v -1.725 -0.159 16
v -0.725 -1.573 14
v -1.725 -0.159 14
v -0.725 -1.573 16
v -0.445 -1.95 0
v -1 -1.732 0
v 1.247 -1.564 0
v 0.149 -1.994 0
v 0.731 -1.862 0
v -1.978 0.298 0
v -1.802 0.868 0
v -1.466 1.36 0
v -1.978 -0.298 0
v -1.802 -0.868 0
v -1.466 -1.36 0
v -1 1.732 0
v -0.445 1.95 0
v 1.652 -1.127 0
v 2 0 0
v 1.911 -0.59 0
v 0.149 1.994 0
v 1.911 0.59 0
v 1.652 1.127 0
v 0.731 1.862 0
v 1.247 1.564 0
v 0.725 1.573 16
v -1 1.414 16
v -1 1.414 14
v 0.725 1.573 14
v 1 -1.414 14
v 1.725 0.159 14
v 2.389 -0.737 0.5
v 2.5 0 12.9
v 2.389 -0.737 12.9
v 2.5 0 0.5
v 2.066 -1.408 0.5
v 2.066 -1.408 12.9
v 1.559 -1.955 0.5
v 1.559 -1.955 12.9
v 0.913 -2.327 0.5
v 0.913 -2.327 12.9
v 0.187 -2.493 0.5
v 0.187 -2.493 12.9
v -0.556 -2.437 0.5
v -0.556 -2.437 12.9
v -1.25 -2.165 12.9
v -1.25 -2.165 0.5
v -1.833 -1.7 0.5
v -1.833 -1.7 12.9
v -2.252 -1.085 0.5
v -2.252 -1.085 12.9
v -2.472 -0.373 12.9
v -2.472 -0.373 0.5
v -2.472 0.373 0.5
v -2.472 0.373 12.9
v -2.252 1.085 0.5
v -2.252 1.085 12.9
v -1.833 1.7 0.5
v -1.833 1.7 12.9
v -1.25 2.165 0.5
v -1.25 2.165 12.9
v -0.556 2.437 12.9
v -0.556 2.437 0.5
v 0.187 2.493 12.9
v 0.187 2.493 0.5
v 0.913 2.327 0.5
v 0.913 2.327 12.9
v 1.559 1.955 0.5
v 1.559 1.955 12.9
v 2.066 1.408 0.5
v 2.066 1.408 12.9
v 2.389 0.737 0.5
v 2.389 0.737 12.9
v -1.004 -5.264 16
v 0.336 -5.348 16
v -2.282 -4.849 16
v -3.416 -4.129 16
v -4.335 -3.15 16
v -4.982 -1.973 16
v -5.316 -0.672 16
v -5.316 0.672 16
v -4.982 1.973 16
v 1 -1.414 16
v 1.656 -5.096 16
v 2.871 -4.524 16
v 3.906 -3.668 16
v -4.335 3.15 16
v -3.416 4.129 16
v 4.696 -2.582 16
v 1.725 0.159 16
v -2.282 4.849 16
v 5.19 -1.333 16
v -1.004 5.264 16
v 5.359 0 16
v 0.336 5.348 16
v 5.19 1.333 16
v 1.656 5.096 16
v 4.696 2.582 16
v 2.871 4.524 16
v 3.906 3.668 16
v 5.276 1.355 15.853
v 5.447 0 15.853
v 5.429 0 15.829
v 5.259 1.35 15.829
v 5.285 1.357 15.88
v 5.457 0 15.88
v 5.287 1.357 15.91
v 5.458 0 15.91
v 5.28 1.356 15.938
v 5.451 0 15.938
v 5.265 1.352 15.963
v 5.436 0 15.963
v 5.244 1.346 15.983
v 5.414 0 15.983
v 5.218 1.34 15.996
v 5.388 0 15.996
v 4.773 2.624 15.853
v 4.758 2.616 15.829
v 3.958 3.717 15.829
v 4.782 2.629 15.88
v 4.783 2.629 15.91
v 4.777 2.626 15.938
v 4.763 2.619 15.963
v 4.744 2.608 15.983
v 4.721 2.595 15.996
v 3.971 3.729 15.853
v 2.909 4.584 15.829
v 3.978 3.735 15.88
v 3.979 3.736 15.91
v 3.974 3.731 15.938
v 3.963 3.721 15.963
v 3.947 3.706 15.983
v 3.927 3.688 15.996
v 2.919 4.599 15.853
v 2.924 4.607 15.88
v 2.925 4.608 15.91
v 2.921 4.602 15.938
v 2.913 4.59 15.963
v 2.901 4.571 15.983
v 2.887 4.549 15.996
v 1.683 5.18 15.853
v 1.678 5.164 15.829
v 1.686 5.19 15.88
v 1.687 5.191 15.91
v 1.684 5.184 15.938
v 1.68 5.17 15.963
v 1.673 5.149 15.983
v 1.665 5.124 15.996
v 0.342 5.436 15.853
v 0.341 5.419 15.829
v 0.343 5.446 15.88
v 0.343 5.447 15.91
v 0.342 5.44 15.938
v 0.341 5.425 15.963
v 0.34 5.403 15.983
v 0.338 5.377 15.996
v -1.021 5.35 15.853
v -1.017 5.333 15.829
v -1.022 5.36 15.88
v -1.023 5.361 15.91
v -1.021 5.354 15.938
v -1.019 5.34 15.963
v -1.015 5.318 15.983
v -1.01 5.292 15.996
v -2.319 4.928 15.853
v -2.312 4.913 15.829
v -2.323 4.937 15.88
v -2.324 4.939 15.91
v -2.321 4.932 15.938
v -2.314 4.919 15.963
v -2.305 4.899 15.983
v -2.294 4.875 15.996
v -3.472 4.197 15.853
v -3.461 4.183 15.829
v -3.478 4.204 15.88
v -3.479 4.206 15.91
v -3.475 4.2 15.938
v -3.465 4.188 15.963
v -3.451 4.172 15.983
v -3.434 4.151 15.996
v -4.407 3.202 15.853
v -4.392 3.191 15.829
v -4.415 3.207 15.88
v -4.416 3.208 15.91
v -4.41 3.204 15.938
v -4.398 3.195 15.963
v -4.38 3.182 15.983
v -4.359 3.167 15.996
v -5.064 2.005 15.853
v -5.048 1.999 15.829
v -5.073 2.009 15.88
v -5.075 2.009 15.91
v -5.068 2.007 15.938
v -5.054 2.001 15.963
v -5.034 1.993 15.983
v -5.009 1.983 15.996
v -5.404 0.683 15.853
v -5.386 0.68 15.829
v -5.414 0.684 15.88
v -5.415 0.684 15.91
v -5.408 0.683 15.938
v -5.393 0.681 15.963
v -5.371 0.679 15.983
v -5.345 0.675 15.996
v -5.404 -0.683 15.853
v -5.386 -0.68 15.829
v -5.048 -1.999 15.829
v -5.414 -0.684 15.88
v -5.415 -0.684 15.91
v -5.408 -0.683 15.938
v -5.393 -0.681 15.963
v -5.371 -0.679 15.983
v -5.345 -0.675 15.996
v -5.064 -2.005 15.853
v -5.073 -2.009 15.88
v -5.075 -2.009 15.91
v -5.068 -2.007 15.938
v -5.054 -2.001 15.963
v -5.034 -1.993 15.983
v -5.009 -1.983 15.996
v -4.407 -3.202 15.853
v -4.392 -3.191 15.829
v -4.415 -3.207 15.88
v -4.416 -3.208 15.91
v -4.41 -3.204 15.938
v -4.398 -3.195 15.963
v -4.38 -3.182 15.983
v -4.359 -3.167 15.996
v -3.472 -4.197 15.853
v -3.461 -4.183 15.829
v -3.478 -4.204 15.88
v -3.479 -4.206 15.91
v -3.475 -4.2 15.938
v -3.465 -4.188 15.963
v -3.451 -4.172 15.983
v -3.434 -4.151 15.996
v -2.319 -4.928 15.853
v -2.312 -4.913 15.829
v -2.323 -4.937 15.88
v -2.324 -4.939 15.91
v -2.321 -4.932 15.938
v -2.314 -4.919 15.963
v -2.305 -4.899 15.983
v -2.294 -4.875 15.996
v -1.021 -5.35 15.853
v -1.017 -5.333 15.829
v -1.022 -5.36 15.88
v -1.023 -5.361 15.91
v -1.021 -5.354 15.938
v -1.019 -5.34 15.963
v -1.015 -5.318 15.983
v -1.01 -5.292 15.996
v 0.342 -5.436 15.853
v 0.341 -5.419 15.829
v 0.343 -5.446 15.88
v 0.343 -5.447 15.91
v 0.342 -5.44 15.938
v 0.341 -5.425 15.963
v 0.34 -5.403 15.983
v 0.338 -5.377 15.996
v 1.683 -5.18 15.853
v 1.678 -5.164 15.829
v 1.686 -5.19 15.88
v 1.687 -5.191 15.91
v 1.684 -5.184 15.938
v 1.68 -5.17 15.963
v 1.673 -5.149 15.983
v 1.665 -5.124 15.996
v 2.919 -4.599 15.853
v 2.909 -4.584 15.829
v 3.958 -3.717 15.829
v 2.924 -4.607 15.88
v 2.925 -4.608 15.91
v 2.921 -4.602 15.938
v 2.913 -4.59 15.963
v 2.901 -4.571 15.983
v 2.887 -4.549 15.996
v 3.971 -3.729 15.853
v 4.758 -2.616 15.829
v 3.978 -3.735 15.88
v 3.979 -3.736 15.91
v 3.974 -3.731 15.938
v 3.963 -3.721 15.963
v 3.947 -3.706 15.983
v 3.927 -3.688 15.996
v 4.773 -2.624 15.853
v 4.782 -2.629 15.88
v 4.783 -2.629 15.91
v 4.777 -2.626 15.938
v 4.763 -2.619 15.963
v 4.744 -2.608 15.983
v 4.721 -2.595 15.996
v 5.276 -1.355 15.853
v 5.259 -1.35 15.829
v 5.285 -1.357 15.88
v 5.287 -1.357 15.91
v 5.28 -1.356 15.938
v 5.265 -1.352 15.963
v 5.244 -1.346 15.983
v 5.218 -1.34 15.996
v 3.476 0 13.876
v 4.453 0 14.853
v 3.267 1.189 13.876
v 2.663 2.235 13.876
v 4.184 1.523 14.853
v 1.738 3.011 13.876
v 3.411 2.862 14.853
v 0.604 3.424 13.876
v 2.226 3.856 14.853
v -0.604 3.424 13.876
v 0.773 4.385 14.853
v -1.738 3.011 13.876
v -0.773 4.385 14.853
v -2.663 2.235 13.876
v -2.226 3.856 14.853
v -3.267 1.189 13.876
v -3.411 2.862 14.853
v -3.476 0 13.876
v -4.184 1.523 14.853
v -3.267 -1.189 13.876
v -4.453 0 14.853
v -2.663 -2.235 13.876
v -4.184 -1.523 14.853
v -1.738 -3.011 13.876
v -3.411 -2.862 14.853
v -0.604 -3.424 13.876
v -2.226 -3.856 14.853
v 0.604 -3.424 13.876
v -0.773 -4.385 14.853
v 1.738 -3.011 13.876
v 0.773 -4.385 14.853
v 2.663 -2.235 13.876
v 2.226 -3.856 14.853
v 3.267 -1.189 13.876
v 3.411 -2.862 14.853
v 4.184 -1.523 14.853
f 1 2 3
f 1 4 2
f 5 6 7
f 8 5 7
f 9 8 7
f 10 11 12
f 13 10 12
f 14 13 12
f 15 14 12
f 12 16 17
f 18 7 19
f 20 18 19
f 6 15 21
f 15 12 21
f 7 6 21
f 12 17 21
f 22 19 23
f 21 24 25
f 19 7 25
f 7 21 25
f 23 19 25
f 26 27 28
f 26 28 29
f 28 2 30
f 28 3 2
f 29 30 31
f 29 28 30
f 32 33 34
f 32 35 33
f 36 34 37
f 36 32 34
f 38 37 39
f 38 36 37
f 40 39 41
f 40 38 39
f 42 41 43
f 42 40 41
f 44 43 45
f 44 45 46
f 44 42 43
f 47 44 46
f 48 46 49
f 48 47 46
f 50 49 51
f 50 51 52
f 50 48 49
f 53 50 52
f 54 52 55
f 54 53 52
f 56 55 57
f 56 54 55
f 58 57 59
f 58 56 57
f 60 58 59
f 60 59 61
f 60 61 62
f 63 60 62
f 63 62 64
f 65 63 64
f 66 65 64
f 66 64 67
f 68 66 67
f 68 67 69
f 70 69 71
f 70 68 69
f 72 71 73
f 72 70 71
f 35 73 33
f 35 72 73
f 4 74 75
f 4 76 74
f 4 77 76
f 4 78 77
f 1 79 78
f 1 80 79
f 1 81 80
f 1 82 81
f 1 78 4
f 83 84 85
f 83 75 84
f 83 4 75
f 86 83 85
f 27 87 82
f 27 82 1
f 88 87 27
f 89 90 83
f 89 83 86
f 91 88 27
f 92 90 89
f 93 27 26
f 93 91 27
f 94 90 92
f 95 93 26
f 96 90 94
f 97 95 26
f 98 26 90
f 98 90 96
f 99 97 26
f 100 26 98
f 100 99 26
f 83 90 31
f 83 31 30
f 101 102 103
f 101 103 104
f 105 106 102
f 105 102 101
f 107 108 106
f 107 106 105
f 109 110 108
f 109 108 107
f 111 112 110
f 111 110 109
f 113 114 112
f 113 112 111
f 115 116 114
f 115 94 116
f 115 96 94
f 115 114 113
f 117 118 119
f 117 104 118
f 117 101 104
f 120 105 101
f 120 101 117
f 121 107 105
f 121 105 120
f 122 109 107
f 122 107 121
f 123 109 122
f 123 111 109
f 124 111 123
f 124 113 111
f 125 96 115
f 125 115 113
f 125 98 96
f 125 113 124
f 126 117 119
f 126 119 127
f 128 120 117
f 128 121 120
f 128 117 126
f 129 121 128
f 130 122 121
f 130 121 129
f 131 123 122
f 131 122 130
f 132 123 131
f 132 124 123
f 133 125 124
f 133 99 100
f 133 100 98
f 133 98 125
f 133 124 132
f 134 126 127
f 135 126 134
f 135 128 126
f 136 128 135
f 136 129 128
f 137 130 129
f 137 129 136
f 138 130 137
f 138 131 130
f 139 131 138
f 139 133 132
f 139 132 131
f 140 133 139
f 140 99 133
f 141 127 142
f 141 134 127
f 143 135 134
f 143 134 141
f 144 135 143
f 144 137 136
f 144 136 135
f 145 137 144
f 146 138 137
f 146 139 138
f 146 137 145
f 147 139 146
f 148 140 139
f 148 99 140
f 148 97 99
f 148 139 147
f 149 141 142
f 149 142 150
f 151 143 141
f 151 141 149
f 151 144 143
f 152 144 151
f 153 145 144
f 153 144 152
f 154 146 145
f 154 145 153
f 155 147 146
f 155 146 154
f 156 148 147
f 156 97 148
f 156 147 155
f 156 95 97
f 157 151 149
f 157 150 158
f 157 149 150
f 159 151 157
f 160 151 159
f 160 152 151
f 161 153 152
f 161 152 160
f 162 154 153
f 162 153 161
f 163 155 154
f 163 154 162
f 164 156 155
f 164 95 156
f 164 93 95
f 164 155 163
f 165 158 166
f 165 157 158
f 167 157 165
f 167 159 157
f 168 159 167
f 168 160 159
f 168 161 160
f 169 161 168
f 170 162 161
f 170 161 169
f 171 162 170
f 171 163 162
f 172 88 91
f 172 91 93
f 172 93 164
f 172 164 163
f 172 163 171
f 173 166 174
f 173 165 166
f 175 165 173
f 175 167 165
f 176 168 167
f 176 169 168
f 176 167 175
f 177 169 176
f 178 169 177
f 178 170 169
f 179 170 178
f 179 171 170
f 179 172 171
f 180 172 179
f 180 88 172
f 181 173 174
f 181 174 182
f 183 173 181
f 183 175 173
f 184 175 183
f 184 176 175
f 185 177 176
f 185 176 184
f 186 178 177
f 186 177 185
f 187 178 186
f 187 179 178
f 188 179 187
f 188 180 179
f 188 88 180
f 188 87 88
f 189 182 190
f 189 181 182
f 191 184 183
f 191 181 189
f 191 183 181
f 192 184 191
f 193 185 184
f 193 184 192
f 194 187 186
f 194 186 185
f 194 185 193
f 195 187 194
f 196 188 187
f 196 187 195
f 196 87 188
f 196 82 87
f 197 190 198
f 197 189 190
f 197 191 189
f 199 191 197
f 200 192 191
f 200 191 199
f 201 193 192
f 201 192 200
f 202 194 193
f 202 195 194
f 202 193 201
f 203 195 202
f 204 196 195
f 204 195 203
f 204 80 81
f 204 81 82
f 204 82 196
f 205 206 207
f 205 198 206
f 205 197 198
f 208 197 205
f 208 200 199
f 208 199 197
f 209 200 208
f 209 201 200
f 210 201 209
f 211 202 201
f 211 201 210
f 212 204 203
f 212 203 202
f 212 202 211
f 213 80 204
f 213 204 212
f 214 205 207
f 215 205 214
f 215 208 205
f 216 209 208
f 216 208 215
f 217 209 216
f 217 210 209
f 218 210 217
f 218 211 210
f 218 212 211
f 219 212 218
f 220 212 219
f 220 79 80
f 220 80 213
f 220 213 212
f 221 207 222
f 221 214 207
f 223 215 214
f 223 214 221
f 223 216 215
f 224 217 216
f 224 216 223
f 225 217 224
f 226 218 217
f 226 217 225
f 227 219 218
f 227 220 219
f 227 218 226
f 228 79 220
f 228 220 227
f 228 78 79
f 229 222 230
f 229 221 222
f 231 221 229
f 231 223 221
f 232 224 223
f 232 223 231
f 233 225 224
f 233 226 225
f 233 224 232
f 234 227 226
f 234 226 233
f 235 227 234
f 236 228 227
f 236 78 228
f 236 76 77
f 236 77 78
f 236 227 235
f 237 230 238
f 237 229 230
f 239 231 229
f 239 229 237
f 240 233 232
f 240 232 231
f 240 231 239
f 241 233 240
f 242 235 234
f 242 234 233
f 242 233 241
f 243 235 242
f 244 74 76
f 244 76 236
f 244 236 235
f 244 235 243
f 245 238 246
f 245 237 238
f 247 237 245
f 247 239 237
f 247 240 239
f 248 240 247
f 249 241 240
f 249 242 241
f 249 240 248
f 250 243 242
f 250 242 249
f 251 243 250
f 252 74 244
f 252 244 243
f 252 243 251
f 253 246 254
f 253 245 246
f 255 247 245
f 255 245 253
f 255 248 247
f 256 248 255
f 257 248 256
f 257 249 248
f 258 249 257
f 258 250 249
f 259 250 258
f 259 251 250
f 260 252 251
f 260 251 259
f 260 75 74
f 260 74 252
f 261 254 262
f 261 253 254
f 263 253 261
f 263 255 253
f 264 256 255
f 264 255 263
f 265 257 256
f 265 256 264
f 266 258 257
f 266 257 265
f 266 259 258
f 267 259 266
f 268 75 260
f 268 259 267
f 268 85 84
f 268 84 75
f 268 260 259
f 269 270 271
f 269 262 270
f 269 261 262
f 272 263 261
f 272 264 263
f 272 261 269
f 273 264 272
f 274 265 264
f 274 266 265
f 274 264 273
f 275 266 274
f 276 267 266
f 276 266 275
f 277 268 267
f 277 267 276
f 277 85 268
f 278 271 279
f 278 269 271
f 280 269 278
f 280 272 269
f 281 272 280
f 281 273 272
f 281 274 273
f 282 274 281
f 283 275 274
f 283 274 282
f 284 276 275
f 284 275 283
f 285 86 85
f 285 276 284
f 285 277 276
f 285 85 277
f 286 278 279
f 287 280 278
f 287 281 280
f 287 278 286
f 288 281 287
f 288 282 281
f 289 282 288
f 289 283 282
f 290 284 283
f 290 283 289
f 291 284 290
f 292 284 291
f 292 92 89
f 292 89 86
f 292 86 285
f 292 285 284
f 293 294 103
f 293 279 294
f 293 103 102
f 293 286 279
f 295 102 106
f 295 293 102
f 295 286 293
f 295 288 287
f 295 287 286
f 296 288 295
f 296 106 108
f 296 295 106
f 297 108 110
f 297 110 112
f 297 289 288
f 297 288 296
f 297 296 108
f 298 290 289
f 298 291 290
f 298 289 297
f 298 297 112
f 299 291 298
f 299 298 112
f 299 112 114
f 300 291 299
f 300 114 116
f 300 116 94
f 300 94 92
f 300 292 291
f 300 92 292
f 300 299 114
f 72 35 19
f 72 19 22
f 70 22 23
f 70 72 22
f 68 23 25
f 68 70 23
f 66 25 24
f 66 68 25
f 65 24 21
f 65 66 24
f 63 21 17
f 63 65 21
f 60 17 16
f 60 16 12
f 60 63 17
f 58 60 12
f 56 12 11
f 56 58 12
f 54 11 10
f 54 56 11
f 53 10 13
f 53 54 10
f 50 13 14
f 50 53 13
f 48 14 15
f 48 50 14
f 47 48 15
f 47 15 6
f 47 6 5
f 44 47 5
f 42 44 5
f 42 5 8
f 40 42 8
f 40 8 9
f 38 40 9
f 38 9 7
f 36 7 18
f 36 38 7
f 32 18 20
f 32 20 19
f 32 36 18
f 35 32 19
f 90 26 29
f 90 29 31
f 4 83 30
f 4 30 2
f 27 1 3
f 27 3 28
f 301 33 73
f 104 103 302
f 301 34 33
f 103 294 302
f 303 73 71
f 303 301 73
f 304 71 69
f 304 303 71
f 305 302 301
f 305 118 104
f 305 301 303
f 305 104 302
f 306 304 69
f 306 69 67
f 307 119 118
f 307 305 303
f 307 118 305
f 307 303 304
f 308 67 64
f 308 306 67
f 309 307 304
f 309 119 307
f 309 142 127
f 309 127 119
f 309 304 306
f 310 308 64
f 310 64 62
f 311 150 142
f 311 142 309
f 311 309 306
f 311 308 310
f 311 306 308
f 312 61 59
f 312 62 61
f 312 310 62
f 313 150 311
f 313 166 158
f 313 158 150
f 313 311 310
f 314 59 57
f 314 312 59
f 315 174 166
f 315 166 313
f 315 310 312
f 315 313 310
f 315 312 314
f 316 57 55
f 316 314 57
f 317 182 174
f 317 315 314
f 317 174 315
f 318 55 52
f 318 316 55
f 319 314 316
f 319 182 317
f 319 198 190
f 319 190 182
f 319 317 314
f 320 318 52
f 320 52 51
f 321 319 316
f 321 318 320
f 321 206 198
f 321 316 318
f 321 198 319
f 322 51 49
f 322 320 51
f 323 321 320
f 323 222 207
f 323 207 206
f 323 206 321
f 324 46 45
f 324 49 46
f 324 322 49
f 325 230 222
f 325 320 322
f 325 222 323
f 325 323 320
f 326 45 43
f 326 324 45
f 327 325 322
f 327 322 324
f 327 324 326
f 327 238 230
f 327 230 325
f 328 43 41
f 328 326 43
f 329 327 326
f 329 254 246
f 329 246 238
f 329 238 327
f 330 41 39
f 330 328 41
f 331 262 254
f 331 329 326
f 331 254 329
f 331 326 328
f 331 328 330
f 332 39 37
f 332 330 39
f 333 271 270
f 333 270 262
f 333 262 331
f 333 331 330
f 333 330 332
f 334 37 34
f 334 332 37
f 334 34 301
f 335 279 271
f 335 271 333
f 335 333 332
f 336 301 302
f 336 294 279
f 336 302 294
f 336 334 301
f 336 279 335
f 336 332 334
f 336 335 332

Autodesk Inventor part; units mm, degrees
ref_plane "YZ Plane" through (0, 0, 0) normal (1, 0, 0) x (0, 1, 0)
ref_plane "XZ Plane" through (0, 0, 0) normal (0, 1, 0) x (-1, 0, 0)
ref_plane "XY Plane" through (0, 0, 0) normal (0, 0, 1) x (1, 0, 0)
sketch "Sketch1" plane through (0, 0, 0) normal (0, 0, 1) x (1, 0, 0)
  circle A0 centre (0, 0) radius 2.5
  dimension "Diameter" = 5
extrude "Extrusion1" add sketch "Sketch1" along normal blind 12.9
sketch "Sketch2" plane through (0, 0, 12.9) normal (0, 0, 1) x (1, 0, 0)
  circle A0 centre (0, 0) radius 2.5 projected
extrude "Extrusion2" add sketch "Sketch2" along normal blind 3.1 draft 45
sketch "Sketch3" plane through (0, 0, 16) normal (0, 0, 1) x (1, 0, 0)
  circle A0 centre (0, 0) radius 5.6 projected
  circle A1 centre (0, 0) radius 1.7321 construction
  line L0 (0.725, 1.573) -> (1.7248, 0.1586)
  line L1 (1.7248, 0.1586) -> (0.9997, -1.4144)
  line L2 (0.9997, -1.4144) -> (-0.725, -1.573)
  line L3 (-0.725, -1.573) -> (-1.7248, -0.1586)
  line L4 (-1.7248, -0.1586) -> (-0.9997, 1.4144)
  line L5 (-0.9997, 1.4144) -> (0.725, 1.573)
  dimension "Hex_Width" = 3
extrude "Extrusion3" cut sketch "Sketch3" against normal blind 2 contours L0 L1 L2 L3 L4 L5
thread "Thread1" size "M5x0.8" class "4g6g" standard "ANSI Metric M Profile" length 12.9
chamfer "Chamfer2" distance 0.5 angle 45 1 edges at (-2.5, 0, 0)
fillet "Fillet1" radius 0.1 1 edges at (-5.6, 0, 16)
equation "\"d10\" = Thread_Length"
equation "\"d13\" = Chamfer"
equation "\"Thread_Length\" = 12.9"
equation "\"Length\" = 16"
equation "\"Chamfer\" = 0.5"
properties part number "SCREW, FLAT HD, P, 12.9, M5X0.8X16MM"
